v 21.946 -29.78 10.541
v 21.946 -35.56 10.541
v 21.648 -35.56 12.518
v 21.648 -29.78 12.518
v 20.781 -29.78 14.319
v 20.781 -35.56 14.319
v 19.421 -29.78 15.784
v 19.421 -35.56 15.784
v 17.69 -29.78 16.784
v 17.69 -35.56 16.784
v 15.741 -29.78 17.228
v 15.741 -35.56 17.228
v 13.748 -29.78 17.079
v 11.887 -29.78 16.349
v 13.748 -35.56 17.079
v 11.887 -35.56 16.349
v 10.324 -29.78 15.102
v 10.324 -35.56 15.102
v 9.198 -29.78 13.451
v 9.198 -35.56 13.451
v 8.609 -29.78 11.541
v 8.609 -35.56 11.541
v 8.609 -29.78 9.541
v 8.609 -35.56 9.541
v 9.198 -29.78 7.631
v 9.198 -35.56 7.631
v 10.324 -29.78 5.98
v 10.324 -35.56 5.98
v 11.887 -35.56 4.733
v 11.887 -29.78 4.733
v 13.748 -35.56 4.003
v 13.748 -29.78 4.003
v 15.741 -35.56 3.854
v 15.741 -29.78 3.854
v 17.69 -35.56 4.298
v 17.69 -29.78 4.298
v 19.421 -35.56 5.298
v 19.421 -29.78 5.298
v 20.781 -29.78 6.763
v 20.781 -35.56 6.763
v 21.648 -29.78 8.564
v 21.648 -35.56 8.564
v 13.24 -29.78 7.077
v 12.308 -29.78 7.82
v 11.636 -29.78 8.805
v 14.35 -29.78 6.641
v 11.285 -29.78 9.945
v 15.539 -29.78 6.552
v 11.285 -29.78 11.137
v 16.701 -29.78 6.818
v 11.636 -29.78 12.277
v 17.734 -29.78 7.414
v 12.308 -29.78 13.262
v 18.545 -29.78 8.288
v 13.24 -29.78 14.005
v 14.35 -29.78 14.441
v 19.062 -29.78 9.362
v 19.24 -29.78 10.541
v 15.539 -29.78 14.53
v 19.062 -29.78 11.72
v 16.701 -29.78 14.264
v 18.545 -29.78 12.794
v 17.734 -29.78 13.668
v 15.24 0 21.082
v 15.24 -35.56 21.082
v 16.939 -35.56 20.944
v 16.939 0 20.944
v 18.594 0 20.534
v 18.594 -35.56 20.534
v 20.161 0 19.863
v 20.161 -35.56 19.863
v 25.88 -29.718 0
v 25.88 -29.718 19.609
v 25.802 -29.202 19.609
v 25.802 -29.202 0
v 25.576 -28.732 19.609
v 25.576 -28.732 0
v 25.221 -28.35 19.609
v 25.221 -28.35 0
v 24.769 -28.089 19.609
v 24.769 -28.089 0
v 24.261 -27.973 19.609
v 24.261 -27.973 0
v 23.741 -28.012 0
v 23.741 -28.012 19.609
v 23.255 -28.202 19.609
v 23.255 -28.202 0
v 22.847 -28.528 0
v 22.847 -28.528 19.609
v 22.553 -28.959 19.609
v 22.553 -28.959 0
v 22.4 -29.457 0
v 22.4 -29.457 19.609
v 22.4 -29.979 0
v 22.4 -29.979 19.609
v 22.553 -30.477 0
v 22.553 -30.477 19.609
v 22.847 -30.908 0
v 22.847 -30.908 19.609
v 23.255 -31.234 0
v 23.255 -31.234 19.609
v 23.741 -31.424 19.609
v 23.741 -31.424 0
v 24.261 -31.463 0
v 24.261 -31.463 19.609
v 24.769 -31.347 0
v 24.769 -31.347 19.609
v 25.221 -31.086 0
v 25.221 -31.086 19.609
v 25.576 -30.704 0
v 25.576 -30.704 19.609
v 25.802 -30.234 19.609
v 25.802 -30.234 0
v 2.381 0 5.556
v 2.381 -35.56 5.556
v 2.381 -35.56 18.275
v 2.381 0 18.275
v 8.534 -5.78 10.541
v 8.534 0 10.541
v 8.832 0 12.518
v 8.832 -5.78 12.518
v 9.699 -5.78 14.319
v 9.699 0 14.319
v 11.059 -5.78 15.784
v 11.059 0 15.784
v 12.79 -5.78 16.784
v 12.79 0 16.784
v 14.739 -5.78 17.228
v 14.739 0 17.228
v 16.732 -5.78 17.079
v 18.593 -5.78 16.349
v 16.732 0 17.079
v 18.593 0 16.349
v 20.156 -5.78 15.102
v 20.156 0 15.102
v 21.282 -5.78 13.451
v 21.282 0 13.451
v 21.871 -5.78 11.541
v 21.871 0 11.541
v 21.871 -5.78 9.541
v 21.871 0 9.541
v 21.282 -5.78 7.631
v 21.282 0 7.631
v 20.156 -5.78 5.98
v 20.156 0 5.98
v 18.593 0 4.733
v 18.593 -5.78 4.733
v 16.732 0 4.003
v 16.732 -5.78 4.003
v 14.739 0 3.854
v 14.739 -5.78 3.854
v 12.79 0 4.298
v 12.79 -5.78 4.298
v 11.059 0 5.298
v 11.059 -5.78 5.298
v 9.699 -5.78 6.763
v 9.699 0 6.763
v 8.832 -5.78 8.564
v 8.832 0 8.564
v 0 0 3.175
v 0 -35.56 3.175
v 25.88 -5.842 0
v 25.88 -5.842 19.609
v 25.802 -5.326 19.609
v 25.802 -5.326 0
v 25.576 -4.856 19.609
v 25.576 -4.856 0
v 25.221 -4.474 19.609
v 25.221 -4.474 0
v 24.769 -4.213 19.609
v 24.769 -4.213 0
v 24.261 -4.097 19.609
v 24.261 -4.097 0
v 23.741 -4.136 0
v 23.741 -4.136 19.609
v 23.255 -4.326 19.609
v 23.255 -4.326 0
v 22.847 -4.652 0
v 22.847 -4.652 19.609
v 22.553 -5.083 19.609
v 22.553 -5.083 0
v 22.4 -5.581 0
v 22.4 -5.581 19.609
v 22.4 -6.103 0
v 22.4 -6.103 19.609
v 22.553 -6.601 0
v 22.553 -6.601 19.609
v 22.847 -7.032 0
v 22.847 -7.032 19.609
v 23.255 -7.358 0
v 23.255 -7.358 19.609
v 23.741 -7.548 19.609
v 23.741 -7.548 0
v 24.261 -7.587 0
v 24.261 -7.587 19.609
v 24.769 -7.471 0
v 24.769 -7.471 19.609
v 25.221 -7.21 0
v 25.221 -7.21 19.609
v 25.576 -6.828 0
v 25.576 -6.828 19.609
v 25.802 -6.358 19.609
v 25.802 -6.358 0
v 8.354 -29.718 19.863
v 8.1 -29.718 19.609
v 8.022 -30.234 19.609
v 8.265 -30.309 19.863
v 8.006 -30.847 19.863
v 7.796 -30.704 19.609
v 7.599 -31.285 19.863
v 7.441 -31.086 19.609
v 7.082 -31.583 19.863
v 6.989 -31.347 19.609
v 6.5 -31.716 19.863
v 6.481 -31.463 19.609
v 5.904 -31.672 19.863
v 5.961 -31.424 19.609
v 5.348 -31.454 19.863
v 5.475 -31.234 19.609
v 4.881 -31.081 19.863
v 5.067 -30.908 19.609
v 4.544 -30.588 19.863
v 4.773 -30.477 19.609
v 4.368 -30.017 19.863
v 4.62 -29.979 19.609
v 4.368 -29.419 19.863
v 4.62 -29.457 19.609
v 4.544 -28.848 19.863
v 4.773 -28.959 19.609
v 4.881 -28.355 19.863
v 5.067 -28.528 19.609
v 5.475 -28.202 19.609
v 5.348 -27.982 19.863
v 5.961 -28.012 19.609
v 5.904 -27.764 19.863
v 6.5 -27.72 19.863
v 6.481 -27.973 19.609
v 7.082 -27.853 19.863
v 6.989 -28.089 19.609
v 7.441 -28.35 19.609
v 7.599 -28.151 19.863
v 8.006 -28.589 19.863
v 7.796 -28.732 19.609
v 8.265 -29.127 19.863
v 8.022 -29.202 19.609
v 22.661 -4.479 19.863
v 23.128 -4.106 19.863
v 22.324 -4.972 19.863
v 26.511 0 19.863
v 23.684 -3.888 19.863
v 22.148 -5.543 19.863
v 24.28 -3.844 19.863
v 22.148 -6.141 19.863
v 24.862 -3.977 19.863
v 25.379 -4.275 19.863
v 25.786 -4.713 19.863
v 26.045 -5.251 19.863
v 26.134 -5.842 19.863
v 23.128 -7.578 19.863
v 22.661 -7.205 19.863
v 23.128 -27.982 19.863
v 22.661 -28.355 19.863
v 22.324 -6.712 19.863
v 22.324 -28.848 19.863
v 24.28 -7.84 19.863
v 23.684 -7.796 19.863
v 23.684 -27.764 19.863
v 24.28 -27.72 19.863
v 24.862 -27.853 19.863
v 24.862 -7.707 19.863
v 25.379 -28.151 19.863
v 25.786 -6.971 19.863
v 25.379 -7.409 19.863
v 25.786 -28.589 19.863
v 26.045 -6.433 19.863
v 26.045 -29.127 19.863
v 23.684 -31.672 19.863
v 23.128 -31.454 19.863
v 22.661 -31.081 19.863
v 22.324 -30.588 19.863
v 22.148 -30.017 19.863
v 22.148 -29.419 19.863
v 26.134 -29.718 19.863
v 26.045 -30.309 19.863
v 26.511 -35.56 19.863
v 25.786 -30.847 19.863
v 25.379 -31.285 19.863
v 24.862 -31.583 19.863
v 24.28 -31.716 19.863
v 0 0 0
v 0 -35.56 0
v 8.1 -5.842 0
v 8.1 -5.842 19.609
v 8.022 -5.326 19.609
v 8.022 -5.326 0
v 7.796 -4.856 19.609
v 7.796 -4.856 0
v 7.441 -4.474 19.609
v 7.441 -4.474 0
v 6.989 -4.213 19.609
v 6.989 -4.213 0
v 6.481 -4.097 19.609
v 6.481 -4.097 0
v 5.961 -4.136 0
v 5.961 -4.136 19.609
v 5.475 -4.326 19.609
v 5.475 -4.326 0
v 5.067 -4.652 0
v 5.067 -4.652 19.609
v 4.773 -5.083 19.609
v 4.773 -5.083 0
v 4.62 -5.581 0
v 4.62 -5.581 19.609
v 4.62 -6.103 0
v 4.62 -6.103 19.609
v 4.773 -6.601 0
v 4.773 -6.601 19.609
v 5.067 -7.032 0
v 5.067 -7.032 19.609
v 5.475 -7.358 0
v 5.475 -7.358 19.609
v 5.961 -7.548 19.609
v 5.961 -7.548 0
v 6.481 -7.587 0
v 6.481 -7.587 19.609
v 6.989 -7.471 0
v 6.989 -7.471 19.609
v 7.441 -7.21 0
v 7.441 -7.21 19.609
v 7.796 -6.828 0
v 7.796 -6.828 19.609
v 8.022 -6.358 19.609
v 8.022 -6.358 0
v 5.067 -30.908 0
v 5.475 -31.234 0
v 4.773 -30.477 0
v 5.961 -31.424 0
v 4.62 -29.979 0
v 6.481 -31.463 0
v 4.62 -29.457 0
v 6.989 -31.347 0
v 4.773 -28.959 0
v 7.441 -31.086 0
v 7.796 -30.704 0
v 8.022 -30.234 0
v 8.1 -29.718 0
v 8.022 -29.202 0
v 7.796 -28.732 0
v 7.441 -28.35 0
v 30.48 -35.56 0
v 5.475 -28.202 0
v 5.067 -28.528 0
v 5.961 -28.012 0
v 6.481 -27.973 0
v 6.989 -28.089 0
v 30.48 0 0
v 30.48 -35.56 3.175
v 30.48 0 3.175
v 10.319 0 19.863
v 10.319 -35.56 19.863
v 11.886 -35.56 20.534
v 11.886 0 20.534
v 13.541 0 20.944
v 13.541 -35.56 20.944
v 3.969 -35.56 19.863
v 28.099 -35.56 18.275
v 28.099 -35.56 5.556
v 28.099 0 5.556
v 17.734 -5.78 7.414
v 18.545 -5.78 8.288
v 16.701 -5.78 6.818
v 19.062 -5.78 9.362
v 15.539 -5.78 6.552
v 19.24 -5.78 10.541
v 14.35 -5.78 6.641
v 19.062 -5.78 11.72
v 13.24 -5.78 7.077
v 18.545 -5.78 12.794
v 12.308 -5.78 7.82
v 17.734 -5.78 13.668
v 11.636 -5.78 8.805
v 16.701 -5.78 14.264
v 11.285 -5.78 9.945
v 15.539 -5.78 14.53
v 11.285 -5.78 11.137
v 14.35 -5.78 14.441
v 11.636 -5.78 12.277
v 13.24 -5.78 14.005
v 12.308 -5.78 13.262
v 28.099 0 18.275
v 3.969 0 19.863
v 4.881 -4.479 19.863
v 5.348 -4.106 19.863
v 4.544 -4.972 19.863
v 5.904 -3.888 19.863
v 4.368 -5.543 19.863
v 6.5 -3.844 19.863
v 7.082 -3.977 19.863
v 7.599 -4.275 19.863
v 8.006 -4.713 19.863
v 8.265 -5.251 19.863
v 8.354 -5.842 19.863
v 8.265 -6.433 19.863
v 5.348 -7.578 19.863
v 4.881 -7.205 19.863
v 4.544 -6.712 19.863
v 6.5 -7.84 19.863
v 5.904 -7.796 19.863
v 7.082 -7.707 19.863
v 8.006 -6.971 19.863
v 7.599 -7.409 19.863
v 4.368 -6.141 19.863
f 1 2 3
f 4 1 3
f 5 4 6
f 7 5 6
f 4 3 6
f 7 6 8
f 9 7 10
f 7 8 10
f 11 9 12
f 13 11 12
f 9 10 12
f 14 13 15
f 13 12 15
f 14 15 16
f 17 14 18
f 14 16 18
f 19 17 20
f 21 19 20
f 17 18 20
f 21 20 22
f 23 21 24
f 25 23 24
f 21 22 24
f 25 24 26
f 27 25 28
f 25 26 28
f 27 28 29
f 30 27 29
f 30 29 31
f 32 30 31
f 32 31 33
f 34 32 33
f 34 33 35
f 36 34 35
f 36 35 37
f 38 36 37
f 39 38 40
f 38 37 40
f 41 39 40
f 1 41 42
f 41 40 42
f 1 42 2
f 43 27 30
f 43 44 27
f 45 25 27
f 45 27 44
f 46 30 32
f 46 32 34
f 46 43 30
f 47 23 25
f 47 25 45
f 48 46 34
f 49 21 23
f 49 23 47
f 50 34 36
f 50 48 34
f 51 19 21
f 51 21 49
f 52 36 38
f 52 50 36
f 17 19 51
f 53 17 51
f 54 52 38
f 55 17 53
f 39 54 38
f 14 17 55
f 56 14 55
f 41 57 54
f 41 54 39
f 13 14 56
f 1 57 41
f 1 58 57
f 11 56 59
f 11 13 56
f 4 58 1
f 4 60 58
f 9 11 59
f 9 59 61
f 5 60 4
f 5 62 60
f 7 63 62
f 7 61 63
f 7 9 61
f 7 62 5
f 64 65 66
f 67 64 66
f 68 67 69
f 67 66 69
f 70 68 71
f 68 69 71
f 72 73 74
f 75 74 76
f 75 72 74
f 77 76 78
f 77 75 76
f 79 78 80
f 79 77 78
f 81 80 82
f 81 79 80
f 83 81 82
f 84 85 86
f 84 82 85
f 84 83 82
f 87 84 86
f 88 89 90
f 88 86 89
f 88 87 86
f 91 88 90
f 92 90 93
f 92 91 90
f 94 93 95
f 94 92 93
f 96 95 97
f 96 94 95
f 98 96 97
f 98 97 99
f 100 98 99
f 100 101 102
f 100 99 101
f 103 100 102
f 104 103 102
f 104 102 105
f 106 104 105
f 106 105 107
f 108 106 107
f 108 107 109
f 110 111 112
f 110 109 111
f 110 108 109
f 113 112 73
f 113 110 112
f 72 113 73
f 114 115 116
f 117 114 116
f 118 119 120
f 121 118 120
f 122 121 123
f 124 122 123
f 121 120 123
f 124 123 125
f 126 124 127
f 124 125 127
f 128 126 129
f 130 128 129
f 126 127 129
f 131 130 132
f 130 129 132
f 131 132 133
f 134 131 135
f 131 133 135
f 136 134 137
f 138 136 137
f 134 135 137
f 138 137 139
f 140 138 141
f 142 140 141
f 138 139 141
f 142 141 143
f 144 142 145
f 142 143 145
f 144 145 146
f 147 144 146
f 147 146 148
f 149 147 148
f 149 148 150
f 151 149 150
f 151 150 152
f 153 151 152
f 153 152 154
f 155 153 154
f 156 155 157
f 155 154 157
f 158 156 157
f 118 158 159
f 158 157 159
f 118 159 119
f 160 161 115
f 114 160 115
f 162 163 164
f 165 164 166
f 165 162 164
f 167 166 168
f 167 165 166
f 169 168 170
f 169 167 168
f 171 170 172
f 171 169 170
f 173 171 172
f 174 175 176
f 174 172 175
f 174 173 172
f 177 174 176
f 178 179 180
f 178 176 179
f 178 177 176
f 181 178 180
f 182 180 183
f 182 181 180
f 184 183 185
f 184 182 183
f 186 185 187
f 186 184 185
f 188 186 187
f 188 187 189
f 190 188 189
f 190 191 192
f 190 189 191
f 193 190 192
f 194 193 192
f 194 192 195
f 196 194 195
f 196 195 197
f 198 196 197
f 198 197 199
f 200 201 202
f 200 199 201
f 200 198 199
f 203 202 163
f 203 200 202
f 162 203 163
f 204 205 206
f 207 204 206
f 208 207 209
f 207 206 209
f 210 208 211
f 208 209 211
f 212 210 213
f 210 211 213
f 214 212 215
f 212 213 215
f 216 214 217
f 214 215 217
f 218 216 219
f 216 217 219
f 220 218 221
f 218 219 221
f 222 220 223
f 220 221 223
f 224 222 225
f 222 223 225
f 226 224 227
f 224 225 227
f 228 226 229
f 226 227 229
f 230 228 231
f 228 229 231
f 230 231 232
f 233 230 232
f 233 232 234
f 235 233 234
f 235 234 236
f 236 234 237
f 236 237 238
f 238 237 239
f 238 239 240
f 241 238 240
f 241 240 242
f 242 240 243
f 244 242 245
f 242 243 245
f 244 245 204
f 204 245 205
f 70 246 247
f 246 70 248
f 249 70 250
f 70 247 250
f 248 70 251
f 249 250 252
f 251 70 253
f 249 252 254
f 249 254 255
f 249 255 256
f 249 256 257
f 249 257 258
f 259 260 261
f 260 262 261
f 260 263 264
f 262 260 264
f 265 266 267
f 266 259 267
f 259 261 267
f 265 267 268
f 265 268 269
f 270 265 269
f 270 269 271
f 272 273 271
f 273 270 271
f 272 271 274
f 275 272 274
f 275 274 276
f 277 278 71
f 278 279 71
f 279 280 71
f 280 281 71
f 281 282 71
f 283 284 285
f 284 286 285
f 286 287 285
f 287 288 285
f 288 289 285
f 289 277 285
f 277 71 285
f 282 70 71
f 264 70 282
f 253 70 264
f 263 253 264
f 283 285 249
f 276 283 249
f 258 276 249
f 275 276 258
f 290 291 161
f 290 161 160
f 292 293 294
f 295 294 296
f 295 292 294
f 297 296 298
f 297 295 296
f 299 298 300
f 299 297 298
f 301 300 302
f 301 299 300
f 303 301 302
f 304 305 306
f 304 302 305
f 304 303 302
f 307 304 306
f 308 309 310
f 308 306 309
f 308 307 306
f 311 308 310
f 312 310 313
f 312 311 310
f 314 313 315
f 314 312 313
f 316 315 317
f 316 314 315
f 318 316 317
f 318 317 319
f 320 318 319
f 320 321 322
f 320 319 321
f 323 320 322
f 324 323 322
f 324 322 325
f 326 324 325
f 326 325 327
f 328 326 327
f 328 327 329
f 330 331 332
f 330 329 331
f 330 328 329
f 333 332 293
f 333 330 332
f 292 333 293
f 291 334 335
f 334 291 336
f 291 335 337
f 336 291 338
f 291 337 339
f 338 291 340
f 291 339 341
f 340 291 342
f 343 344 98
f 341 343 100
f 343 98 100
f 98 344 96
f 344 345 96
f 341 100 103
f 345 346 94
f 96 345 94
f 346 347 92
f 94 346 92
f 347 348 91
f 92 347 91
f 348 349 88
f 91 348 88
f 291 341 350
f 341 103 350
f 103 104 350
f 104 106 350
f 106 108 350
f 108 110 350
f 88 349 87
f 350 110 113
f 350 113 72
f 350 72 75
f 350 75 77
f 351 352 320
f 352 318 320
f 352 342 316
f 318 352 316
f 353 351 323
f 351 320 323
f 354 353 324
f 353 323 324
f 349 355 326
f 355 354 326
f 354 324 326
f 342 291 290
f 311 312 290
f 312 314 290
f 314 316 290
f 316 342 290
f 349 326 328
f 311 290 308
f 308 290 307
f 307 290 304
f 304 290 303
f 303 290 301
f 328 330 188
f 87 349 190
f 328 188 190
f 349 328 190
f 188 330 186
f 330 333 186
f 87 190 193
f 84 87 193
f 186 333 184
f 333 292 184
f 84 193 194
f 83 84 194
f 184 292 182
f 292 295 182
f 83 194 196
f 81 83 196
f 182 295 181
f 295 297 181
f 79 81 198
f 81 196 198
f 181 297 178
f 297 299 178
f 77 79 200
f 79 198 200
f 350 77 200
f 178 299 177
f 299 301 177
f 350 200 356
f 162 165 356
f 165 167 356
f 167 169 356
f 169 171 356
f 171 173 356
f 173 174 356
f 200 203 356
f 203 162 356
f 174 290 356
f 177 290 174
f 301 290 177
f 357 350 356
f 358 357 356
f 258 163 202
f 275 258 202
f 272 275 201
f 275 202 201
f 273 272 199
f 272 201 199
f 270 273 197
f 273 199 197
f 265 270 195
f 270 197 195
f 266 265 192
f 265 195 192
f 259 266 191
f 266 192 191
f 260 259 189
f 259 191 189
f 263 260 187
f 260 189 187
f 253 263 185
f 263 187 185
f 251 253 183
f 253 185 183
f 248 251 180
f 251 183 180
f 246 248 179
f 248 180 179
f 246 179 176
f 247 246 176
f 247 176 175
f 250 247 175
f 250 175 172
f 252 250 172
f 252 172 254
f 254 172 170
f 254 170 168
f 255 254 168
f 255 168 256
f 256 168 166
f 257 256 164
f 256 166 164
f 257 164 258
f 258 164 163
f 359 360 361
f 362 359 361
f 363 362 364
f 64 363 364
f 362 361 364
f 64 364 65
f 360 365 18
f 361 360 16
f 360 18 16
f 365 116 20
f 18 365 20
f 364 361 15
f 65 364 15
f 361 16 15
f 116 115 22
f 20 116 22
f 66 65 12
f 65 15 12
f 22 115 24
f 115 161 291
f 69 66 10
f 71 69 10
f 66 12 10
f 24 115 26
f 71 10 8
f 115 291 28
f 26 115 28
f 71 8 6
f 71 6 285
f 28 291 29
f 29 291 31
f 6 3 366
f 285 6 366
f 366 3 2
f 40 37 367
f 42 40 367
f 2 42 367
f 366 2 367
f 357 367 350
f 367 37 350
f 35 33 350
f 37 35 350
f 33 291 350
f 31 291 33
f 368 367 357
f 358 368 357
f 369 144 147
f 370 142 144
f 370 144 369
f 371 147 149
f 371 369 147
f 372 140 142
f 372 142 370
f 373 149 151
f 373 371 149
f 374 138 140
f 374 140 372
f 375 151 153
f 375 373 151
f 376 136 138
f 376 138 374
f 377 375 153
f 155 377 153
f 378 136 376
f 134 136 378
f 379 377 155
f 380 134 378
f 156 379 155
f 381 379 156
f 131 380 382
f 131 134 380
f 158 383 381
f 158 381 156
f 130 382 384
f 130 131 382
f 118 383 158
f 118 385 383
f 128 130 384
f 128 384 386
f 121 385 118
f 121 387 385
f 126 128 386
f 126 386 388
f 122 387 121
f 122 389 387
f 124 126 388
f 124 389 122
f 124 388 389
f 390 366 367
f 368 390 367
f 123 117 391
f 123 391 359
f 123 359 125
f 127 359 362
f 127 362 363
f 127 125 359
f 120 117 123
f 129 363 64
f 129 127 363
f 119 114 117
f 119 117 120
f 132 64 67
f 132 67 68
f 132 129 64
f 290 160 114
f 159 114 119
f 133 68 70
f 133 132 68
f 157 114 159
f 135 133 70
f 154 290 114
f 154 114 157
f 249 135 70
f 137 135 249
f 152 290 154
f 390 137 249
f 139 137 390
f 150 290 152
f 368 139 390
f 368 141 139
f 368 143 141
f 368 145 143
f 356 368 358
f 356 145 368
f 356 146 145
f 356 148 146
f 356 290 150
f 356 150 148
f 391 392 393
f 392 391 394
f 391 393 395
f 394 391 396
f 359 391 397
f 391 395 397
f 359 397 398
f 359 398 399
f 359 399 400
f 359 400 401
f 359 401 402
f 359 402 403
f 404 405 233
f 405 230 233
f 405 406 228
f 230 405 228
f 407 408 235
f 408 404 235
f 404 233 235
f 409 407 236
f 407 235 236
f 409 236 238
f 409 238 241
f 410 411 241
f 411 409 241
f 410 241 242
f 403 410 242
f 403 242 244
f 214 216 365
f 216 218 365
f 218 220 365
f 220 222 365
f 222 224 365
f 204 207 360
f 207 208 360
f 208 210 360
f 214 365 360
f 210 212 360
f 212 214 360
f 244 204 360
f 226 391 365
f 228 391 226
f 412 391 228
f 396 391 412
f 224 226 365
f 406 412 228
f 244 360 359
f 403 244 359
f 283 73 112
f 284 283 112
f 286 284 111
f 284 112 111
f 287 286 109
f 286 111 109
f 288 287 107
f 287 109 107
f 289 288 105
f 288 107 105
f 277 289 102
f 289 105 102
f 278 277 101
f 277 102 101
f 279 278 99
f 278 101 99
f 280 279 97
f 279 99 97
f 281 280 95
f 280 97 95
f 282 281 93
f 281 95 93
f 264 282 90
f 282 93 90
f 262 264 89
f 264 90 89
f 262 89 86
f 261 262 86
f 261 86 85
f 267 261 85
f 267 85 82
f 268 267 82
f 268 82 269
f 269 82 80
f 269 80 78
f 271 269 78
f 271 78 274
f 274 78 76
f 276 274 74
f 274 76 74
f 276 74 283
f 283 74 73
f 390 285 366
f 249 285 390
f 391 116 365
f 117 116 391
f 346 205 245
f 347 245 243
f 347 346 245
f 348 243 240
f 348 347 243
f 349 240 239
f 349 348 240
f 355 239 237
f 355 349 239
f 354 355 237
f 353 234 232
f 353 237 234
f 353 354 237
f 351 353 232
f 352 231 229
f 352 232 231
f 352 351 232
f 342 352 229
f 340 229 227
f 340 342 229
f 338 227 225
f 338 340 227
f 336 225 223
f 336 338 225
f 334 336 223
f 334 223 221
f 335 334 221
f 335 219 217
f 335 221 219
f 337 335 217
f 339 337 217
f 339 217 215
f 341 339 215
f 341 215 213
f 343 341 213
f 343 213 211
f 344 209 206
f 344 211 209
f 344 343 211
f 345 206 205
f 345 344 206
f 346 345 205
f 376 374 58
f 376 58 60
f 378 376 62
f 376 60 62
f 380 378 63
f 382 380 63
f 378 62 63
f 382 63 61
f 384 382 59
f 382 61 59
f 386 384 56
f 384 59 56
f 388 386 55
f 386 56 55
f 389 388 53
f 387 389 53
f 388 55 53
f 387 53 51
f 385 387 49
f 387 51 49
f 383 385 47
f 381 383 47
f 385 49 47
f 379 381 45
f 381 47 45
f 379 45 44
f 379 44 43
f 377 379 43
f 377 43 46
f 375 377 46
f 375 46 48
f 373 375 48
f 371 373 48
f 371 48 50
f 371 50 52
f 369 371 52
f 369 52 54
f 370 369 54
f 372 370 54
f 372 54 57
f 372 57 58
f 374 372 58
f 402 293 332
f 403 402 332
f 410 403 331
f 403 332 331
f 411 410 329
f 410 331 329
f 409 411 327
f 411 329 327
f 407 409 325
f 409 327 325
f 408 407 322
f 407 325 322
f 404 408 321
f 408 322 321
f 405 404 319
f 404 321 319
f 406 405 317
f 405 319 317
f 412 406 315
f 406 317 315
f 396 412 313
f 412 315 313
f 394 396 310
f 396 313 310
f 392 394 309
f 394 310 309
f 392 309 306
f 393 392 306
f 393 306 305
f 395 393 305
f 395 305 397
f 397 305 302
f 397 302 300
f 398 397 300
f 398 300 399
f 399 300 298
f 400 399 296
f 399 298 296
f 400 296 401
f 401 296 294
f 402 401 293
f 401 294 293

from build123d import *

# Parameters (mm, degrees)
F0_W     = 30.48
F0_H     = 35.56
F0_R     = 1.75
F1_DEPTH = 21.082
F2_R     = 4
F3_DEPTH = 35.56
F4_SIZE  = 1.5875
F5_SIZE  = 0.254
F6_R     = 6.706248
F7_DEPTH = 5.779999
F8_R     = 6.706248
F9_DEPTH = 5.779999


with BuildPart() as f1:
    # F0 (on Top) → F1 (new body)
    with BuildSketch(Plane.XY):
        with Locations((15.24, -17.78)):
            Rectangle(F0_W, F0_H)
        with Locations((6.35, -29.718)):
            Circle(F0_R, mode=Mode.SUBTRACT)
        with Locations((24.13, -29.718)):
            Circle(F0_R, mode=Mode.SUBTRACT)
        with Locations((6.35, -5.842)):
            Circle(F0_R, mode=Mode.SUBTRACT)
        with Locations((24.13, -5.842)):
            Circle(F0_R, mode=Mode.SUBTRACT)
    extrude(amount=F1_DEPTH)

    # F2 (on face) → F3 (cut, through all)
    with BuildSketch(Plane.XZ.offset(35.56)):
        with Locations((15.24, 10.541)):
            Circle(F2_R)
        with BuildLine():
            ThreePointArc((10.31875, 19.862694), (12.704975, 20.772634), (15.24, 21.082))
            Line((15.24, 21.082), (0, 21.082))
            Line((0, 21.082), (0, 3.175))
            Line((0, 3.175), (2.38125, 5.55625))
            Line((2.38125, 5.55625), (2.38125, 19.862694))
            Line((2.38125, 19.862694), (10.31875, 19.862694))
        make_face()
        with BuildLine():
            ThreePointArc((15.24, 21.082), (17.775025, 20.772634), (20.16125, 19.862694))
            Line((20.16125, 19.862694), (28.09875, 19.862694))
            Line((28.09875, 19.862694), (28.09875, 5.55625))
            Line((28.09875, 5.55625), (30.48, 3.175))
            Line((30.48, 3.175), (30.48, 21.082))
            Line((30.48, 21.082), (15.24, 21.082))
        make_face()
    extrude(amount=-F3_DEPTH, mode=Mode.SUBTRACT)

    # F4
    f4_edges = [f1.edges().sort_by_distance(p)[0] for p in [
        (28.09875, -17.78, 19.862694),
        (2.38125, -17.78, 19.862694),
    ]]
    chamfer(f4_edges, length=F4_SIZE)

    # F5
    f5_edges = [f1.edges().sort_by_distance(p)[0] for p in [
        (22.38, -29.718, 19.862694),
        (22.38, -5.842, 19.862694),
        (4.6, -5.842, 19.862694),
        (4.6, -29.718, 19.862694),
    ]]
    chamfer(f5_edges, length=F5_SIZE)

    # F6 (on face) → F7 (cut)
    with BuildSketch(Plane.XZ.offset(35.56)):
        with Locations((15.24, 10.541)):
            Circle(F6_R)
    extrude(amount=-F7_DEPTH, mode=Mode.SUBTRACT)

    # F8 (on face) → F9 (cut)
    with BuildSketch(Plane(origin=(0, 0, 0), x_dir=(-1, 0, 0), z_dir=(0, 1, 0))):
        with Locations((-15.24, 10.541)):
            Circle(F8_R)
    extrude(amount=-F9_DEPTH, mode=Mode.SUBTRACT)


solid = f1.part
